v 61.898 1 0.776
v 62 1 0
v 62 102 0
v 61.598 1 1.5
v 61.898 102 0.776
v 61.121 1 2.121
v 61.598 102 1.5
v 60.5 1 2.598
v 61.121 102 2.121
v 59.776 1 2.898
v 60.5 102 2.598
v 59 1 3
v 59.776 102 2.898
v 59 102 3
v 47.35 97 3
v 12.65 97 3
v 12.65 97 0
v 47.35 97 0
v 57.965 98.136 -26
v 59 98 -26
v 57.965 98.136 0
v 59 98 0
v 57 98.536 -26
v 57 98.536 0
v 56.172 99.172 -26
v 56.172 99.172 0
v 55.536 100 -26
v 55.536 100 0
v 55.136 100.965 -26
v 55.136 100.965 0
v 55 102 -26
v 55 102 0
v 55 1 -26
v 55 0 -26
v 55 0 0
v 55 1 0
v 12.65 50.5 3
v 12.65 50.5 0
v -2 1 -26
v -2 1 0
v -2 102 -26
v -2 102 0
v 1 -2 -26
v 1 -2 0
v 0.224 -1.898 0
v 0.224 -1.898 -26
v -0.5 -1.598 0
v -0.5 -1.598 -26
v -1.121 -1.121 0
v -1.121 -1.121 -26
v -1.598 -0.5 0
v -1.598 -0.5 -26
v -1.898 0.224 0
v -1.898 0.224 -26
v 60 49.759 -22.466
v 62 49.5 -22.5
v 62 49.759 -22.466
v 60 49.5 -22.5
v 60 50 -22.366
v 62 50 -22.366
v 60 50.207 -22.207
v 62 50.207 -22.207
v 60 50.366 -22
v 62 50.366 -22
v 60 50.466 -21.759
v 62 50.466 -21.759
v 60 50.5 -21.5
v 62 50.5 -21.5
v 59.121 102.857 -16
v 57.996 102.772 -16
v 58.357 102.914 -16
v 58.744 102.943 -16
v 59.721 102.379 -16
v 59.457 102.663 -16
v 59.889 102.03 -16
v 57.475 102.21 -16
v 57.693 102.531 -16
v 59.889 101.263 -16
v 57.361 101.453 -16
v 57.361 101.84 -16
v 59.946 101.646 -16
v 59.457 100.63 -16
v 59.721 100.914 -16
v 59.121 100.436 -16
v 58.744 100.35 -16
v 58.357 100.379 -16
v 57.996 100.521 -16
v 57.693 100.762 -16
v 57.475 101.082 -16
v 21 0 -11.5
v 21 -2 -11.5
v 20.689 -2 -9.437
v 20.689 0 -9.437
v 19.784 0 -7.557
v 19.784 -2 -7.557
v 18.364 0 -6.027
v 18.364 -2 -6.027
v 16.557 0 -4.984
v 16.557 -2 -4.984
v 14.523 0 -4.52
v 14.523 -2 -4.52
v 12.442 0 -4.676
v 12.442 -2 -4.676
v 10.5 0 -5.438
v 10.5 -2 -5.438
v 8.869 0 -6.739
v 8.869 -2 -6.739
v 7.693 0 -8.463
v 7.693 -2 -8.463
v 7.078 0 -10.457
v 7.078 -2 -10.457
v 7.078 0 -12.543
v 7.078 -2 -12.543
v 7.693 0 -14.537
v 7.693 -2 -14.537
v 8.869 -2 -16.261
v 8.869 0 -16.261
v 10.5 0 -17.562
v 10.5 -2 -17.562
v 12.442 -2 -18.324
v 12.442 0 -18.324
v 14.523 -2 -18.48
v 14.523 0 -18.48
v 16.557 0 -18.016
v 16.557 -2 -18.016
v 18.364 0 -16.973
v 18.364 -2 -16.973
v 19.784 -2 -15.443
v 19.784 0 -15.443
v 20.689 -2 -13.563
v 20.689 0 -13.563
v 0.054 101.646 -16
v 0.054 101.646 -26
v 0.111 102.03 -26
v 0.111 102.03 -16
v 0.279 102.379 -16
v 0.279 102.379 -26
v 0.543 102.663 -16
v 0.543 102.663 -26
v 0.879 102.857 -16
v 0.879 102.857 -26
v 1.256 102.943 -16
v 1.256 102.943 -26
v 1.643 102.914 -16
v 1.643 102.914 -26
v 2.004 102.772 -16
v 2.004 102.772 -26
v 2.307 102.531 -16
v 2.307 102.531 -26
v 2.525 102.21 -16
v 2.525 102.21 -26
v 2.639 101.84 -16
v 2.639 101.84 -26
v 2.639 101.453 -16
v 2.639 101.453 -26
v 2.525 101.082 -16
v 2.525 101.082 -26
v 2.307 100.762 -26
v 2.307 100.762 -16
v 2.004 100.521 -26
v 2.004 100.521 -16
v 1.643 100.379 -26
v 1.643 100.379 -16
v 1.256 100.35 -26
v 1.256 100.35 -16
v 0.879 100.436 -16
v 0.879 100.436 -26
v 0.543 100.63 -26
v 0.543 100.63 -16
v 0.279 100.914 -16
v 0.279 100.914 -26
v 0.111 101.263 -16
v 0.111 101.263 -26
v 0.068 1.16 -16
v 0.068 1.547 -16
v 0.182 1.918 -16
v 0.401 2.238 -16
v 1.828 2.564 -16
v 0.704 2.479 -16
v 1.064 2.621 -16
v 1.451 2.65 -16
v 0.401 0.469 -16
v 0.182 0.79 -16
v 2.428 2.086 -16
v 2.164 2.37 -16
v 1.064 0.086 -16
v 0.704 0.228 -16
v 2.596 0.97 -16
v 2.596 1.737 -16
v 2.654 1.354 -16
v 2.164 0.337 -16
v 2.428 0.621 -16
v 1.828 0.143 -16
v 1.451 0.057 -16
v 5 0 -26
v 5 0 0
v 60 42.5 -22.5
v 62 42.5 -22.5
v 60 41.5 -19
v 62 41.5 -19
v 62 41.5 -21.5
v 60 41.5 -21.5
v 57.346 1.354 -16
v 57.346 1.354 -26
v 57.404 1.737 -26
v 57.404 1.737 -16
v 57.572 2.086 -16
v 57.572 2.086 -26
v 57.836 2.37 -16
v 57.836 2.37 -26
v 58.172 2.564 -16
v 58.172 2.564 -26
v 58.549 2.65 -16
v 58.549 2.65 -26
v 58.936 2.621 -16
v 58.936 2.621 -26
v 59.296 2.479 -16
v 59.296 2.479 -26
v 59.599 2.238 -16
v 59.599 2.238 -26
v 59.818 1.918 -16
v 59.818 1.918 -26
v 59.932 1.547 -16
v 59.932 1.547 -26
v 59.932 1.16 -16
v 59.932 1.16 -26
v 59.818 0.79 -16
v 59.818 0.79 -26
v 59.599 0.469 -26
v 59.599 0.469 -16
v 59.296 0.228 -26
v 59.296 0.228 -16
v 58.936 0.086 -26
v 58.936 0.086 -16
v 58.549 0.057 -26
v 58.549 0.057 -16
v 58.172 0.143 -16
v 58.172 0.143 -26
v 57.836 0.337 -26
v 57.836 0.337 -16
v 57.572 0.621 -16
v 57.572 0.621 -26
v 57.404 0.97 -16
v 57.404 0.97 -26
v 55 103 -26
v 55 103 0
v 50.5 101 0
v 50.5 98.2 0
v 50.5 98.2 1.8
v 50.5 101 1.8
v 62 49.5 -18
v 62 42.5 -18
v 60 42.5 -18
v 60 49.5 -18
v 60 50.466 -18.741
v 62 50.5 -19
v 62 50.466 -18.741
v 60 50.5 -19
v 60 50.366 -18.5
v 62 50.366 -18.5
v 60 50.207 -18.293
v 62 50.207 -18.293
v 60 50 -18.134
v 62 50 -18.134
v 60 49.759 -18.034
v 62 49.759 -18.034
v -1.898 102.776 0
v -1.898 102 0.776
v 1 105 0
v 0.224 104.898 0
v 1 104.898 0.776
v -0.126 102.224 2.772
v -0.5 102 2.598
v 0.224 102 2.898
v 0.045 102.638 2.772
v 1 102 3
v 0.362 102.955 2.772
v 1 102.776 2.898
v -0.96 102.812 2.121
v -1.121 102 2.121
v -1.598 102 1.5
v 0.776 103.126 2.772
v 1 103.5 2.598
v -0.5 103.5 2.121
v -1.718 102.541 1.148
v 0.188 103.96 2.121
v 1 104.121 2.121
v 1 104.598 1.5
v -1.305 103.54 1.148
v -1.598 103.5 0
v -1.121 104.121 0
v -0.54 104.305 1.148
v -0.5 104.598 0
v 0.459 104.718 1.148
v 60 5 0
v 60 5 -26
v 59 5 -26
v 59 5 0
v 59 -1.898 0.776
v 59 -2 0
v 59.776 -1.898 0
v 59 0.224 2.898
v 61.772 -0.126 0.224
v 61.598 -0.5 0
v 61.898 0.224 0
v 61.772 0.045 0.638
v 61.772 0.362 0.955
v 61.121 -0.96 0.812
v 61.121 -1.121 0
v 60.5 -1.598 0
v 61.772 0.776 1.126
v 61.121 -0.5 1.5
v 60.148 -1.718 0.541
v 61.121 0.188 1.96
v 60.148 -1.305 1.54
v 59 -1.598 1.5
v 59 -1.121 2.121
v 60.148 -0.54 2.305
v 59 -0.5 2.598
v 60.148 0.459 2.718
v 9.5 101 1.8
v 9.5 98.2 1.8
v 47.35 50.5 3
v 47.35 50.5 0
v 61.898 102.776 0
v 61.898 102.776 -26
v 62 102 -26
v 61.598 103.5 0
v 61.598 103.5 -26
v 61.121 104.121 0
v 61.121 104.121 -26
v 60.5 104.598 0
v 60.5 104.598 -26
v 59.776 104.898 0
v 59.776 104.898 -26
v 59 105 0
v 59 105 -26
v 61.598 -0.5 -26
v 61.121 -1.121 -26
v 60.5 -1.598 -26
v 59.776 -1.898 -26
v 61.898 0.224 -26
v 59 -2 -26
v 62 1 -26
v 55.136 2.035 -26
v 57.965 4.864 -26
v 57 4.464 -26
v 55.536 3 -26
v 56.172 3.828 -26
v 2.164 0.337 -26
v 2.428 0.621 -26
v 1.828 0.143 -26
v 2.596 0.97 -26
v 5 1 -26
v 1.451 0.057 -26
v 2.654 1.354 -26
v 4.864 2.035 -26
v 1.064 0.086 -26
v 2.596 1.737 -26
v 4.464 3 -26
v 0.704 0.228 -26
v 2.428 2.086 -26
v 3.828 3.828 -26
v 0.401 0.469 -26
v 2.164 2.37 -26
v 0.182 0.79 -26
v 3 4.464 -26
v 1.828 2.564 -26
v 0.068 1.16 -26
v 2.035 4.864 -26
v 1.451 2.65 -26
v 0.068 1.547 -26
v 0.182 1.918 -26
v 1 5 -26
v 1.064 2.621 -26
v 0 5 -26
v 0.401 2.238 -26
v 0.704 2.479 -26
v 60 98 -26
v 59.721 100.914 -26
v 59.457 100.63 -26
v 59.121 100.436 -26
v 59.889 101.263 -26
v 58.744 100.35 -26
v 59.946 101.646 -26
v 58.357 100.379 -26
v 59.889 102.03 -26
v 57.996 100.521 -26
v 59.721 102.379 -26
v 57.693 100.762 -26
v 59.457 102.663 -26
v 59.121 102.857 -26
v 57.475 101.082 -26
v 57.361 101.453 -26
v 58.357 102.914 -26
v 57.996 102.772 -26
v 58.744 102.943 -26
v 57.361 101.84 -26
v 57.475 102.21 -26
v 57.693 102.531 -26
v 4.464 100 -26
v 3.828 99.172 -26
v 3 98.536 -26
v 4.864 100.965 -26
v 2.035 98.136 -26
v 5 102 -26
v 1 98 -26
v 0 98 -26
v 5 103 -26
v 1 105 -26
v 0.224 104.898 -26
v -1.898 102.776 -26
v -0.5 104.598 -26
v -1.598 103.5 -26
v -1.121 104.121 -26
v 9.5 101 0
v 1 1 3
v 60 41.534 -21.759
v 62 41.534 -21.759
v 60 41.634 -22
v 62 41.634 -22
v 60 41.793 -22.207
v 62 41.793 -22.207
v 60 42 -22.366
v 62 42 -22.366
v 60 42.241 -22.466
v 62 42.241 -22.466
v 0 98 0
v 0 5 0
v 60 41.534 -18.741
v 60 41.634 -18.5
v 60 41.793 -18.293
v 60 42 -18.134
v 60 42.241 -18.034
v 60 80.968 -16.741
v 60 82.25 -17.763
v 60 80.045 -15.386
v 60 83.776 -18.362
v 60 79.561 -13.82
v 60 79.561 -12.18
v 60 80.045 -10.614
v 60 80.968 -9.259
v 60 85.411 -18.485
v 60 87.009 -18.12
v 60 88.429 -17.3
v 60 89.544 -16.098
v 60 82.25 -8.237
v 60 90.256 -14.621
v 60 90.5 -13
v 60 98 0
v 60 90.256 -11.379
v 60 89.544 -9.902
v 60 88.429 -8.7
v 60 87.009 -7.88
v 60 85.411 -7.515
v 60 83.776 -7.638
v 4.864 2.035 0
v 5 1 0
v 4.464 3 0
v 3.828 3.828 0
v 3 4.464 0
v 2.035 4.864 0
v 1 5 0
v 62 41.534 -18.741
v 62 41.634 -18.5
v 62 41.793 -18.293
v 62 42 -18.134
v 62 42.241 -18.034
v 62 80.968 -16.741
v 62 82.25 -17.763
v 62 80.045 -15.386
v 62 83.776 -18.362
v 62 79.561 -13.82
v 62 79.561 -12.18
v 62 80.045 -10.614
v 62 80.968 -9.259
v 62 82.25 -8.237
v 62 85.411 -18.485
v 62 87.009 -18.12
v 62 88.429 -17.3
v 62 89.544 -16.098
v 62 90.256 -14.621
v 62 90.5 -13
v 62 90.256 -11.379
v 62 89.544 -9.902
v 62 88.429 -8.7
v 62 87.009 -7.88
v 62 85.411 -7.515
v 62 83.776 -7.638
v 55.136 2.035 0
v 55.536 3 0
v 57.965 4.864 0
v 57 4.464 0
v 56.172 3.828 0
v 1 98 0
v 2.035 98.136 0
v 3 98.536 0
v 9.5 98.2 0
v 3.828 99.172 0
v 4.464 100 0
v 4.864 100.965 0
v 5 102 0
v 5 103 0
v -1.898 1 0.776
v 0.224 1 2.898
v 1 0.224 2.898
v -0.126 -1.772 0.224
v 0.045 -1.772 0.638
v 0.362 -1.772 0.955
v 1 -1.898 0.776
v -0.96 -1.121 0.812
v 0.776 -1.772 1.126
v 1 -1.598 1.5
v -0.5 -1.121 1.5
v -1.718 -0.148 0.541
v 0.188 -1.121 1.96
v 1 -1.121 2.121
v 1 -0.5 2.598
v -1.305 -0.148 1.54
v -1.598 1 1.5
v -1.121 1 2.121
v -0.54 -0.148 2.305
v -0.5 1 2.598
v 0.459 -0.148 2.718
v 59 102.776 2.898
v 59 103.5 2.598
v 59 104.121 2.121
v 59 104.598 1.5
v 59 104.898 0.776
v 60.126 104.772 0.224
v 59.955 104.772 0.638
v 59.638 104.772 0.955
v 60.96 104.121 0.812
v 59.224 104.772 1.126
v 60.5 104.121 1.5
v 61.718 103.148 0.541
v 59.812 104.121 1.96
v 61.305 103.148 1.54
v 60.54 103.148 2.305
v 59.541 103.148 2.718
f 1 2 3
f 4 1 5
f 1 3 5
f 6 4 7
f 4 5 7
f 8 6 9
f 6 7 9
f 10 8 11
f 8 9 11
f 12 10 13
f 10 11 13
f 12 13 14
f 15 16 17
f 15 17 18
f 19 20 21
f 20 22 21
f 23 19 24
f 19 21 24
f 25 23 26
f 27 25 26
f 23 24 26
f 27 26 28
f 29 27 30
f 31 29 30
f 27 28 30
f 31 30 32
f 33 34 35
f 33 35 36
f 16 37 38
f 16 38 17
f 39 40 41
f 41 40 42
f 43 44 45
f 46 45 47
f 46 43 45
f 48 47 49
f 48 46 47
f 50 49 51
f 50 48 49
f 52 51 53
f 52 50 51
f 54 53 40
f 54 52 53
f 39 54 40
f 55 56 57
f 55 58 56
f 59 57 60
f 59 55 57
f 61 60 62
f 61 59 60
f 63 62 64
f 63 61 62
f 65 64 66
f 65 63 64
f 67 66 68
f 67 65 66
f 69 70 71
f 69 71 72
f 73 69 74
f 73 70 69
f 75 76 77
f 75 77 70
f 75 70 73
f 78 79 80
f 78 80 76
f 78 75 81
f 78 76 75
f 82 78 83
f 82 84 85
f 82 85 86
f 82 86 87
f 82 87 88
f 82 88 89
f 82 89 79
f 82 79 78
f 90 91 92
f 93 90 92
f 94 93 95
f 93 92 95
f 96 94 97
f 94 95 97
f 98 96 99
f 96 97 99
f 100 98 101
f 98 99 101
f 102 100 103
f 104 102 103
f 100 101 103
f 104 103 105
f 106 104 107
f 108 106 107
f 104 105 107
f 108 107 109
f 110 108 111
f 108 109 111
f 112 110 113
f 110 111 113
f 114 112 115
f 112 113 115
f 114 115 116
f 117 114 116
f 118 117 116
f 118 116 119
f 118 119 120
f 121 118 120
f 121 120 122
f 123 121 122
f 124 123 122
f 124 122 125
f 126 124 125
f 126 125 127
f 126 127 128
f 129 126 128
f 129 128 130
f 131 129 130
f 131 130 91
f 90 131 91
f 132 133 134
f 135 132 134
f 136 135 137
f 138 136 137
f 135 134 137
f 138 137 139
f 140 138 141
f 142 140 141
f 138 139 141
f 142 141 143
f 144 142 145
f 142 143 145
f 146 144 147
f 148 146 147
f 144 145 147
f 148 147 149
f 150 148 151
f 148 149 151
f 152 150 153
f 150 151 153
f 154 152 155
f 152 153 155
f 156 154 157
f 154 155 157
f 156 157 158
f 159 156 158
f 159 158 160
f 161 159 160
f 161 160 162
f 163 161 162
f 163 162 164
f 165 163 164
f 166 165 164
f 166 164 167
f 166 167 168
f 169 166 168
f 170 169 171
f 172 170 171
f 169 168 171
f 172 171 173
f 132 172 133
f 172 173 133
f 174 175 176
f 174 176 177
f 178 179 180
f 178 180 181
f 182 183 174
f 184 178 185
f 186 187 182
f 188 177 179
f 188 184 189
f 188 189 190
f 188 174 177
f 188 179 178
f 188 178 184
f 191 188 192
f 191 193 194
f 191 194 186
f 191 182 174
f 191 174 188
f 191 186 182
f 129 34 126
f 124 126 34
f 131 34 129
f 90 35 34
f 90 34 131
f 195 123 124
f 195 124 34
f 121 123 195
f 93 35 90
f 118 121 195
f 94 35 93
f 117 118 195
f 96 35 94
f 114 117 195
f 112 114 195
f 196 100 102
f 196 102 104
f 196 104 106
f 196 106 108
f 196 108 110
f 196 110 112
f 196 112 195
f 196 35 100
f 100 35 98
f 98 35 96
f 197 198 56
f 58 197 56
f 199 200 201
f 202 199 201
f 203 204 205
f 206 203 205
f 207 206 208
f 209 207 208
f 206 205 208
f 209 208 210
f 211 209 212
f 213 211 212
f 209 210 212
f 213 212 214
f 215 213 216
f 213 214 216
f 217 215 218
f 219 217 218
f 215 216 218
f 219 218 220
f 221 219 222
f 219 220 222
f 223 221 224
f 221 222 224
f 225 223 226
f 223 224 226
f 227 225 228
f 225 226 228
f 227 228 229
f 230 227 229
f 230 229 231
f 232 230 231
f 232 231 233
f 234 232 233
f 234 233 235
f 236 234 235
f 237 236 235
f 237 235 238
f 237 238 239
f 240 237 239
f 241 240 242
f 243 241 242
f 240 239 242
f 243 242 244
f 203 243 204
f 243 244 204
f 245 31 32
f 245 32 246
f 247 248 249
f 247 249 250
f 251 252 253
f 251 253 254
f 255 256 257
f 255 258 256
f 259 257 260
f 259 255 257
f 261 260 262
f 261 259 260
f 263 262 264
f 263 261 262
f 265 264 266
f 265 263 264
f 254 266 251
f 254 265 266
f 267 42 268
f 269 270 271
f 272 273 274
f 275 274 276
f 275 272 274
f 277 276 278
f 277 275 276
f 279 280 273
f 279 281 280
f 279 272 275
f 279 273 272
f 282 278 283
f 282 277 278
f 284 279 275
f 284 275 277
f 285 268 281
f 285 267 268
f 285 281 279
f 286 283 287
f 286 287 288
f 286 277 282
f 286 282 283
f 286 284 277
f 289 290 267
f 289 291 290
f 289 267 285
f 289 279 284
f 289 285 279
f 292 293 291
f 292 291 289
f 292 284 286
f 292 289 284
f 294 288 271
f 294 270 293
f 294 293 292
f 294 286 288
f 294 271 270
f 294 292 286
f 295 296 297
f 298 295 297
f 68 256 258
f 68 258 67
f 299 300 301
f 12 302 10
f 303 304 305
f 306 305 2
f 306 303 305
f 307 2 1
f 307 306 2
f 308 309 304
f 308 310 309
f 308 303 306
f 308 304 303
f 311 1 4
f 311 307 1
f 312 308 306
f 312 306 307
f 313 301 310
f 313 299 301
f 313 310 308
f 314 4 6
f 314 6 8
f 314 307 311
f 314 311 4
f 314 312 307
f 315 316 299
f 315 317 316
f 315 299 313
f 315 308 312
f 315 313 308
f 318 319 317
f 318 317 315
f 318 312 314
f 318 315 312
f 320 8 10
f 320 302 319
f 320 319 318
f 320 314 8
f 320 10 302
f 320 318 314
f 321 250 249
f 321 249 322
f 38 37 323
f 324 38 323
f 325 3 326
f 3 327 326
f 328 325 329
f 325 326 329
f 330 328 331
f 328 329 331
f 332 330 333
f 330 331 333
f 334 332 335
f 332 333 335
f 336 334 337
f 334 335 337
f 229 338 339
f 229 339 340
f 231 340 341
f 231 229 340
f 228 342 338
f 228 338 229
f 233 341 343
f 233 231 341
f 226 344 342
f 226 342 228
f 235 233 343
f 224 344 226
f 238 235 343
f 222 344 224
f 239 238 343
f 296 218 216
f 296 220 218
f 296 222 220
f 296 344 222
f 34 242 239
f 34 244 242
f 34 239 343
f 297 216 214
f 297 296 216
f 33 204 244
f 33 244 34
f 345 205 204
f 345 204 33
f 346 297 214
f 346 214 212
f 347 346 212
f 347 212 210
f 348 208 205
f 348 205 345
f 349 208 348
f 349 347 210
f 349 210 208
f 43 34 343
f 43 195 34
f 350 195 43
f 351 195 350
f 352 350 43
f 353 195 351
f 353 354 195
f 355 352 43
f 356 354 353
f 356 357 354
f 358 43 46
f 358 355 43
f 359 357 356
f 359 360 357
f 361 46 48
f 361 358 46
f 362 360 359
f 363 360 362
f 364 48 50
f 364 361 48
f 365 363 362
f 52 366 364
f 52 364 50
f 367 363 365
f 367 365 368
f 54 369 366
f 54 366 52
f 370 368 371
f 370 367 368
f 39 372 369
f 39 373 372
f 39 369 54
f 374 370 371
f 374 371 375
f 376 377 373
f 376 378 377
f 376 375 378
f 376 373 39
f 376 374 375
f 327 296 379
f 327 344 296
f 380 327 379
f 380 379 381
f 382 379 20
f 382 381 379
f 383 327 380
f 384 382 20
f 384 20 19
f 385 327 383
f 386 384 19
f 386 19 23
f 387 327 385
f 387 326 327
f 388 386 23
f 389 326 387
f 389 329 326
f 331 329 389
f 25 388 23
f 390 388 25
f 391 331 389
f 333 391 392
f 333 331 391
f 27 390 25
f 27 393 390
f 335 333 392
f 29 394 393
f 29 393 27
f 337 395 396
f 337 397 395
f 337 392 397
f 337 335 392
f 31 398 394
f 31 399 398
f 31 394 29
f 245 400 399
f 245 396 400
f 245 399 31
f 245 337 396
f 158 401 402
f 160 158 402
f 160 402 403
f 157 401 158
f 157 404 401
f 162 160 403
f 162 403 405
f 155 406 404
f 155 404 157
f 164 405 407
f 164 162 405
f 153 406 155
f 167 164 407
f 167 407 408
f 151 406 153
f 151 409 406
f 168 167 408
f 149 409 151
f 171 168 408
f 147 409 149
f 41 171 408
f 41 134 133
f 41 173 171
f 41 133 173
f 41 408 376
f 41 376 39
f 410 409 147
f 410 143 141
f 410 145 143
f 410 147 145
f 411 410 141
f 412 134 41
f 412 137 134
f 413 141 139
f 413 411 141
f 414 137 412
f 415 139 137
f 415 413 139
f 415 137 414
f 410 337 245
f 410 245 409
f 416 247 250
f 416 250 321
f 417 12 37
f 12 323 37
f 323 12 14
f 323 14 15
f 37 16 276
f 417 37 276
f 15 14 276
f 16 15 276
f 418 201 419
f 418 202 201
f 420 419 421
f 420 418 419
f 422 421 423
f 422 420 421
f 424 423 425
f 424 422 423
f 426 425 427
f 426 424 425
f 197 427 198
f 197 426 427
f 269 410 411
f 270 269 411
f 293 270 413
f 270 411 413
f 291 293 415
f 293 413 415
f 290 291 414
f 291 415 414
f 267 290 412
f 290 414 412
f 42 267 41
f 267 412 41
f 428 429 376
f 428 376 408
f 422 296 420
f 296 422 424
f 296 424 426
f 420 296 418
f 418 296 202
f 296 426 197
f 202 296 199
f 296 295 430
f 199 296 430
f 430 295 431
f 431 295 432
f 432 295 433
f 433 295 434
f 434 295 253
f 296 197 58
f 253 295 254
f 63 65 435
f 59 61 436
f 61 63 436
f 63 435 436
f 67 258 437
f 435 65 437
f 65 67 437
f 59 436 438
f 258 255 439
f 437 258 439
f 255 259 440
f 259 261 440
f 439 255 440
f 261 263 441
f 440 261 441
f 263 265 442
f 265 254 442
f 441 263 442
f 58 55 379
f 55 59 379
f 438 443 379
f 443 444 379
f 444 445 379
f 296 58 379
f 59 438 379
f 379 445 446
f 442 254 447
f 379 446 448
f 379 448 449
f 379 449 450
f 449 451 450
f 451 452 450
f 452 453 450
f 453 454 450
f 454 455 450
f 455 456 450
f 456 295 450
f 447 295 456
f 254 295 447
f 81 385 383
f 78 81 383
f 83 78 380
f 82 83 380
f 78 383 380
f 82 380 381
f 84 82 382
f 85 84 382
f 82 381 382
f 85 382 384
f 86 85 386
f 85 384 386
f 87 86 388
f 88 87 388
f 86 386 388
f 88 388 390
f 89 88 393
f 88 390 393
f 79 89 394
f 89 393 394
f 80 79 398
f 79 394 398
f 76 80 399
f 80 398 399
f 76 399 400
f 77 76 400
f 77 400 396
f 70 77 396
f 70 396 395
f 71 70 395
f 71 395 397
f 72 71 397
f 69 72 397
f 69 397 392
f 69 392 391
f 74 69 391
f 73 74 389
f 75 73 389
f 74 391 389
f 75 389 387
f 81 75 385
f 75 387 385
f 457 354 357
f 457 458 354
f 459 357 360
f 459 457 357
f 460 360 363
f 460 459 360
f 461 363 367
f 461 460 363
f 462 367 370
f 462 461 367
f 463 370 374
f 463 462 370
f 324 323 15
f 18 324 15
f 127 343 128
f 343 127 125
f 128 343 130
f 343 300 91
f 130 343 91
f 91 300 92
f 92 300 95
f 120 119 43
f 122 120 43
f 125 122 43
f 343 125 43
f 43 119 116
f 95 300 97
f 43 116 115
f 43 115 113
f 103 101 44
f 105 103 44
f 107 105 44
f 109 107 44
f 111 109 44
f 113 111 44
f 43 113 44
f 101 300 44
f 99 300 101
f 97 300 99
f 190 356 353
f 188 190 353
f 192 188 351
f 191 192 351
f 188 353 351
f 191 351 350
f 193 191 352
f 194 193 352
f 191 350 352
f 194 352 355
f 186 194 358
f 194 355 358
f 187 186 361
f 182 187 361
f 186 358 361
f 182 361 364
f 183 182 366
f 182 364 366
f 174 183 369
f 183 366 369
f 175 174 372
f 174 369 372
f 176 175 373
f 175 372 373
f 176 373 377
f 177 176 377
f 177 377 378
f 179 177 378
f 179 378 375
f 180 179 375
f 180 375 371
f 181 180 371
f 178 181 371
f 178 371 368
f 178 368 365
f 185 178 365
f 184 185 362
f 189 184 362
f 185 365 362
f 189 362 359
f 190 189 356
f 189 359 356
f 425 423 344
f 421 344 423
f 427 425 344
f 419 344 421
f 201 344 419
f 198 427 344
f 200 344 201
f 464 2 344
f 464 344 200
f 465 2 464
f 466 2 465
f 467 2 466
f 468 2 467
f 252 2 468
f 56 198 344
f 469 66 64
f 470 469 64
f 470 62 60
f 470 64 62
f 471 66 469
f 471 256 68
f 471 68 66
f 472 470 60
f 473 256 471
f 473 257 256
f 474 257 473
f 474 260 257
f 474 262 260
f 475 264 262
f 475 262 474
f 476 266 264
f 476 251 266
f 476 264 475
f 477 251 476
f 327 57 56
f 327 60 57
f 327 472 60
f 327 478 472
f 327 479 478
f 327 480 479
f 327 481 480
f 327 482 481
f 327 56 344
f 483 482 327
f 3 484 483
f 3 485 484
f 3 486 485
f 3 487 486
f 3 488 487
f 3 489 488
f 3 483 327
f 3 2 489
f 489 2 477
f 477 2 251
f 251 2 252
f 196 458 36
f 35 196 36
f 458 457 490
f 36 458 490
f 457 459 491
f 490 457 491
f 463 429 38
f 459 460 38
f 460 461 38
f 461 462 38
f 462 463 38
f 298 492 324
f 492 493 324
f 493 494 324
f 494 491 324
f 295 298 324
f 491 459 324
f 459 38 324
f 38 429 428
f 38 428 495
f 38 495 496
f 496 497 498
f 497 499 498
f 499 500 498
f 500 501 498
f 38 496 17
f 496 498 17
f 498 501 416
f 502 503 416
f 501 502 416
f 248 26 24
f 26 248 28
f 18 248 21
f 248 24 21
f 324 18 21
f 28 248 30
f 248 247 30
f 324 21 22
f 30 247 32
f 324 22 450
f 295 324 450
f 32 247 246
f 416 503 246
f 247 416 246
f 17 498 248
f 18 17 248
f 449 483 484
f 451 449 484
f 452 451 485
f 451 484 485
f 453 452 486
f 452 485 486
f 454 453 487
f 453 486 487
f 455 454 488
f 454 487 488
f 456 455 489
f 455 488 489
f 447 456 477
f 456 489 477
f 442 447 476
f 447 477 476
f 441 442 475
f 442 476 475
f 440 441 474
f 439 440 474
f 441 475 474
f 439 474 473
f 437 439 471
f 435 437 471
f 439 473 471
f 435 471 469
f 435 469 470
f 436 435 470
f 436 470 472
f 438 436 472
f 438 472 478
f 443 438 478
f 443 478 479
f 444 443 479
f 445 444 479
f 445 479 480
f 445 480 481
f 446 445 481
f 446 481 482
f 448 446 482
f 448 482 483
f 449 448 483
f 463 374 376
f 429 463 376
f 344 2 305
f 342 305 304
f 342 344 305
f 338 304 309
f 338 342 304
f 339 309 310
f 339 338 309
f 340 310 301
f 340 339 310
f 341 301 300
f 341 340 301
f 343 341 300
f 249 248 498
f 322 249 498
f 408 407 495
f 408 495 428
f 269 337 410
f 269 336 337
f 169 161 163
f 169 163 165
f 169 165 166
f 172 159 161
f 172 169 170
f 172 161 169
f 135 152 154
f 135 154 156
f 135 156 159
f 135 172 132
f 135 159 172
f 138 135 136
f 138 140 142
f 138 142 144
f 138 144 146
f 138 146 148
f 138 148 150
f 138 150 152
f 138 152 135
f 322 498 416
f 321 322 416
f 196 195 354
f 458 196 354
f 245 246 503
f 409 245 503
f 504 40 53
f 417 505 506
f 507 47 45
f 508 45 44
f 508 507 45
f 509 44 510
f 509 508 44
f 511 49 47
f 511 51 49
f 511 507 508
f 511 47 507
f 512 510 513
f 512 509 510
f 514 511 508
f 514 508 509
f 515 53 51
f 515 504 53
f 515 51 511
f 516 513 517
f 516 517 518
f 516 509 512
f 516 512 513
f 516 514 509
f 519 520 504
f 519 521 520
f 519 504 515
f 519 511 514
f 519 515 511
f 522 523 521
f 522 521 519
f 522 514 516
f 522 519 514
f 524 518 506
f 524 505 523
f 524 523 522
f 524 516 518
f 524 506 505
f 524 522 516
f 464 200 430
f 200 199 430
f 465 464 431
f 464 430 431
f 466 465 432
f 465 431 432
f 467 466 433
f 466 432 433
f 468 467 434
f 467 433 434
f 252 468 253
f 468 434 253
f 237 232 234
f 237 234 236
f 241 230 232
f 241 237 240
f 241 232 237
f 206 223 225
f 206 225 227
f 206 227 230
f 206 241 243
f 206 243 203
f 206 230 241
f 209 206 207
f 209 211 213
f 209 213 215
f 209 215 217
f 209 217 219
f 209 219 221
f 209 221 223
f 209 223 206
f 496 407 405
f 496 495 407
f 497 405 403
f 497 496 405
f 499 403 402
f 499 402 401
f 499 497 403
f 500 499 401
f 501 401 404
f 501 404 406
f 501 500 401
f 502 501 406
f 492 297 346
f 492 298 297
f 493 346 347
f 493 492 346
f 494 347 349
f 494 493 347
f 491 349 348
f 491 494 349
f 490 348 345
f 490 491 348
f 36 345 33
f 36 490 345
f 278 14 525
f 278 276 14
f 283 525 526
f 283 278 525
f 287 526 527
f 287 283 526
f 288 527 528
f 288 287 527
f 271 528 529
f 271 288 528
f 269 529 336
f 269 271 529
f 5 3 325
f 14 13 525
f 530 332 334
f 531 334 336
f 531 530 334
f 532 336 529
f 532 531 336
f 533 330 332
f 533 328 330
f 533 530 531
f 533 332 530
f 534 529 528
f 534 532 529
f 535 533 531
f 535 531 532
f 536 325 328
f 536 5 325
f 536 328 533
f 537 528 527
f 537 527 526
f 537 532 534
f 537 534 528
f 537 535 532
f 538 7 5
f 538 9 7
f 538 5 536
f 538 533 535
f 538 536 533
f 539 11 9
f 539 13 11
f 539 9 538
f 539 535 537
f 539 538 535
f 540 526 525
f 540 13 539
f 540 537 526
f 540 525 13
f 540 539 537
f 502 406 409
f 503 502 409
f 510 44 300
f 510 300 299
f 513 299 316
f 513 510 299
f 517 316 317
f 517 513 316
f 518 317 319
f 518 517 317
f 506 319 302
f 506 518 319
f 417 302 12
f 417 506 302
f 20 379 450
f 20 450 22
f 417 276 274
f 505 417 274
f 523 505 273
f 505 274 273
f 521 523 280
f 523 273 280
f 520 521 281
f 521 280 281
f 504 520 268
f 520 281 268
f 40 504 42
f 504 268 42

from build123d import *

# Parameters (mm, degrees)
ESQUISSE1_W             = 60
ESQUISSE1_H             = 103
BOSS_EXTRU_1_DEPTH      = 3
ESQUISSE2_W             = 34.7
ESQUISSE2_H             = 46.5
ENL_V_MAT_EXTRU_1_DEPTH = 120.239255281
ESQUISSE3_W             = 41
ESQUISSE3_H             = 2.8
ENL_V_MAT_EXTRU_2_DEPTH = 1.8
BOSS_EXTRU_2_DEPTH      = 26
BOSS_EXTRU_2_DEPTH_BACK = 3
ESQUISSE4_W             = 64
ESQUISSE4_H             = 107
ESQUISSE4_W_2           = 60
ESQUISSE4_H_2           = 103
ENL_V_MAT_EXTRU_3_REACH = 127.686
ESQUISSE5_R             = 5.5
ESQUISSE5_W             = 4.5
ESQUISSE5_H             = 9
CONG_1_R                = 1
CONG_2_R                = 3
ESQUISSE6_W             = 5
ESQUISSE6_H             = 5
BOSS_EXTRU_3_DEPTH      = 26
CONG_3_R                = 4
ESQUISSE7_R             = 1.3
ENL_V_MAT_EXTRU_4_DEPTH = 10
ENL_V_MAT_EXTRU_5_REACH = 128.369
ESQUISSE8_R             = 7


with BuildPart() as part:
    # Esquisse1 → Boss.-Extru.1 (new body)
    with BuildSketch(Plane.XY):
        with Locations((30, 51.5)):
            Rectangle(ESQUISSE1_W, ESQUISSE1_H)
    extrude(amount=BOSS_EXTRU_1_DEPTH)

    # Esquisse2 → Enlèv. mat.-Extru.1 (cut, through all)
    with BuildSketch(Plane.XY.offset(3)):
        with Locations((30, 73.75)):
            Rectangle(ESQUISSE2_W, ESQUISSE2_H)
    extrude(amount=-ENL_V_MAT_EXTRU_1_DEPTH, mode=Mode.SUBTRACT)

    # Esquisse3 → Enlèv. mat.-Extru.2 (cut)
    with BuildSketch(Plane(origin=(0, 0, 0), x_dir=(-1, 0, 0), z_dir=(0, 0, -1))):
        with Locations((-30, 99.6)):
            Rectangle(ESQUISSE3_W, ESQUISSE3_H)
    extrude(amount=-ENL_V_MAT_EXTRU_2_DEPTH, mode=Mode.SUBTRACT)

    # Esquisse4 → Boss.-Extru.2 (add, two sides: drawn at the far end of the back side and taken through both)
    with BuildSketch(Plane(origin=(0, 0, 0), x_dir=(-1, 0, 0), z_dir=(0, 0, -1)).offset(-BOSS_EXTRU_2_DEPTH_BACK)):
        with Locations((-30, 51.5)):
            Rectangle(ESQUISSE4_W, ESQUISSE4_H)
        with Locations((-30, 51.5)):
            Rectangle(ESQUISSE4_W_2, ESQUISSE4_H_2, mode=Mode.SUBTRACT)
    extrude(amount=BOSS_EXTRU_2_DEPTH + BOSS_EXTRU_2_DEPTH_BACK)

    # Esquisse5 → Enlèv. mat.-Extru.3 (cut, up to next)
    with BuildSketch(Plane(origin=(62, 0, 0), x_dir=(0, 0, -1), z_dir=(1, 0, 0)), mode=Mode.PRIVATE) as enl_v_mat_extru_3_sk1:
        with Locations(Location((13, 85, 0), (0, 0, 90))):
            Circle(ESQUISSE5_R)
    enl_v_mat_extru_3_tool1 = extrude(enl_v_mat_extru_3_sk1.sketch, amount=-ENL_V_MAT_EXTRU_3_REACH, mode=Mode.PRIVATE) & part.part
    # Esquisse5 → Enlèv. mat.-Extru.3 (cut, up to next)
    with BuildSketch(Plane(origin=(62, 0, 0), x_dir=(0, 0, -1), z_dir=(1, 0, 0)), mode=Mode.PRIVATE) as enl_v_mat_extru_3_sk2:
        with Locations((20.25, 46)):
            Rectangle(ESQUISSE5_W, ESQUISSE5_H)
    enl_v_mat_extru_3_tool2 = extrude(enl_v_mat_extru_3_sk2.sketch, amount=-ENL_V_MAT_EXTRU_3_REACH, mode=Mode.PRIVATE) & part.part
    add(enl_v_mat_extru_3_tool1.solids().sort_by_distance((62, 85, -13))[0], mode=Mode.SUBTRACT)
    add(enl_v_mat_extru_3_tool2.solids().sort_by_distance((62, 46, -20.25))[0], mode=Mode.SUBTRACT)

    # Congé1
    cong_1_edges = [part.edges().sort_by_distance(p)[0] for p in [
        (61, 41.5, -18),
        (61, 50.5, -18),
        (61, 50.5, -22.5),
        (61, 41.5, -22.5),
    ]]
    fillet(cong_1_edges, radius=CONG_1_R)

    # Congé2
    cong_2_edges = [part.edges().sort_by_distance(p)[0] for p in [
        (-2, 105, -11.5),
        (-2, 51.5, 3),
        (-2, -2, -11.5),
        (30, -2, 3),
        (62, -2, -11.5),
        (62, 51.5, 3),
        (62, 105, -11.5),
        (30, 105, 3),
    ]]
    fillet(cong_2_edges, radius=CONG_2_R)

    # Esquisse6 → Boss.-Extru.3 (add)
    with BuildSketch(Plane(origin=(0, 0, -26), x_dir=(-1, 0, 0), z_dir=(0, 0, -1))):
        with Locations((-57.5, 100.5)):
            Rectangle(ESQUISSE6_W, ESQUISSE6_H)
        with Locations((-2.5, 100.5)):
            Rectangle(ESQUISSE6_W, ESQUISSE6_H)
        with Locations((-2.5, 2.5)):
            Rectangle(ESQUISSE6_W, ESQUISSE6_H)
        with Locations((-57.5, 2.5)):
            Rectangle(ESQUISSE6_W, ESQUISSE6_H)
    extrude(amount=-BOSS_EXTRU_3_DEPTH)

    # Congé3
    cong_3_edges = [part.edges().sort_by_distance(p)[0] for p in [
        (55, 98, -13),
        (5, 98, -13),
        (5, 5, -13),
        (55, 5, -13),
    ]]
    fillet(cong_3_edges, radius=CONG_3_R)

    # Esquisse7 → Enlèv. mat.-Extru.4 (cut)
    with BuildSketch(Plane(origin=(0, 0, -26), x_dir=(-1, 0, 0), z_dir=(0, 0, -1))):
        with Locations((-1.353553391, 101.646446609)):
            Circle(ESQUISSE7_R)
        with Locations(Location((-58.646446609, 101.646446609, 0), (0, 0, 180))):
            Circle(ESQUISSE7_R)
        with Locations((-58.646446609, 1.353553391)):
            Circle(ESQUISSE7_R)
        with Locations(Location((-1.353553391, 1.353553391, 0), (0, 0, 180))):
            Circle(ESQUISSE7_R)
    extrude(amount=-ENL_V_MAT_EXTRU_4_DEPTH, mode=Mode.SUBTRACT)

    # Esquisse8 → Enlèv. mat.-Extru.5 (cut, up to next)
    with BuildSketch(Plane(origin=(0, -2, 0), x_dir=(-1, 0, 0), z_dir=(0, -1, 0)), mode=Mode.PRIVATE) as enl_v_mat_extru_5_sk1:
        with Locations(Location((-14, 11.5, 0), (0, 0, 180))):
            Circle(ESQUISSE8_R)
    enl_v_mat_extru_5_tool1 = extrude(enl_v_mat_extru_5_sk1.sketch, amount=-ENL_V_MAT_EXTRU_5_REACH, mode=Mode.PRIVATE) & part.part
    add(enl_v_mat_extru_5_tool1.solids().sort_by_distance((14, -2, -11.5))[0], mode=Mode.SUBTRACT)


solid = part.part
